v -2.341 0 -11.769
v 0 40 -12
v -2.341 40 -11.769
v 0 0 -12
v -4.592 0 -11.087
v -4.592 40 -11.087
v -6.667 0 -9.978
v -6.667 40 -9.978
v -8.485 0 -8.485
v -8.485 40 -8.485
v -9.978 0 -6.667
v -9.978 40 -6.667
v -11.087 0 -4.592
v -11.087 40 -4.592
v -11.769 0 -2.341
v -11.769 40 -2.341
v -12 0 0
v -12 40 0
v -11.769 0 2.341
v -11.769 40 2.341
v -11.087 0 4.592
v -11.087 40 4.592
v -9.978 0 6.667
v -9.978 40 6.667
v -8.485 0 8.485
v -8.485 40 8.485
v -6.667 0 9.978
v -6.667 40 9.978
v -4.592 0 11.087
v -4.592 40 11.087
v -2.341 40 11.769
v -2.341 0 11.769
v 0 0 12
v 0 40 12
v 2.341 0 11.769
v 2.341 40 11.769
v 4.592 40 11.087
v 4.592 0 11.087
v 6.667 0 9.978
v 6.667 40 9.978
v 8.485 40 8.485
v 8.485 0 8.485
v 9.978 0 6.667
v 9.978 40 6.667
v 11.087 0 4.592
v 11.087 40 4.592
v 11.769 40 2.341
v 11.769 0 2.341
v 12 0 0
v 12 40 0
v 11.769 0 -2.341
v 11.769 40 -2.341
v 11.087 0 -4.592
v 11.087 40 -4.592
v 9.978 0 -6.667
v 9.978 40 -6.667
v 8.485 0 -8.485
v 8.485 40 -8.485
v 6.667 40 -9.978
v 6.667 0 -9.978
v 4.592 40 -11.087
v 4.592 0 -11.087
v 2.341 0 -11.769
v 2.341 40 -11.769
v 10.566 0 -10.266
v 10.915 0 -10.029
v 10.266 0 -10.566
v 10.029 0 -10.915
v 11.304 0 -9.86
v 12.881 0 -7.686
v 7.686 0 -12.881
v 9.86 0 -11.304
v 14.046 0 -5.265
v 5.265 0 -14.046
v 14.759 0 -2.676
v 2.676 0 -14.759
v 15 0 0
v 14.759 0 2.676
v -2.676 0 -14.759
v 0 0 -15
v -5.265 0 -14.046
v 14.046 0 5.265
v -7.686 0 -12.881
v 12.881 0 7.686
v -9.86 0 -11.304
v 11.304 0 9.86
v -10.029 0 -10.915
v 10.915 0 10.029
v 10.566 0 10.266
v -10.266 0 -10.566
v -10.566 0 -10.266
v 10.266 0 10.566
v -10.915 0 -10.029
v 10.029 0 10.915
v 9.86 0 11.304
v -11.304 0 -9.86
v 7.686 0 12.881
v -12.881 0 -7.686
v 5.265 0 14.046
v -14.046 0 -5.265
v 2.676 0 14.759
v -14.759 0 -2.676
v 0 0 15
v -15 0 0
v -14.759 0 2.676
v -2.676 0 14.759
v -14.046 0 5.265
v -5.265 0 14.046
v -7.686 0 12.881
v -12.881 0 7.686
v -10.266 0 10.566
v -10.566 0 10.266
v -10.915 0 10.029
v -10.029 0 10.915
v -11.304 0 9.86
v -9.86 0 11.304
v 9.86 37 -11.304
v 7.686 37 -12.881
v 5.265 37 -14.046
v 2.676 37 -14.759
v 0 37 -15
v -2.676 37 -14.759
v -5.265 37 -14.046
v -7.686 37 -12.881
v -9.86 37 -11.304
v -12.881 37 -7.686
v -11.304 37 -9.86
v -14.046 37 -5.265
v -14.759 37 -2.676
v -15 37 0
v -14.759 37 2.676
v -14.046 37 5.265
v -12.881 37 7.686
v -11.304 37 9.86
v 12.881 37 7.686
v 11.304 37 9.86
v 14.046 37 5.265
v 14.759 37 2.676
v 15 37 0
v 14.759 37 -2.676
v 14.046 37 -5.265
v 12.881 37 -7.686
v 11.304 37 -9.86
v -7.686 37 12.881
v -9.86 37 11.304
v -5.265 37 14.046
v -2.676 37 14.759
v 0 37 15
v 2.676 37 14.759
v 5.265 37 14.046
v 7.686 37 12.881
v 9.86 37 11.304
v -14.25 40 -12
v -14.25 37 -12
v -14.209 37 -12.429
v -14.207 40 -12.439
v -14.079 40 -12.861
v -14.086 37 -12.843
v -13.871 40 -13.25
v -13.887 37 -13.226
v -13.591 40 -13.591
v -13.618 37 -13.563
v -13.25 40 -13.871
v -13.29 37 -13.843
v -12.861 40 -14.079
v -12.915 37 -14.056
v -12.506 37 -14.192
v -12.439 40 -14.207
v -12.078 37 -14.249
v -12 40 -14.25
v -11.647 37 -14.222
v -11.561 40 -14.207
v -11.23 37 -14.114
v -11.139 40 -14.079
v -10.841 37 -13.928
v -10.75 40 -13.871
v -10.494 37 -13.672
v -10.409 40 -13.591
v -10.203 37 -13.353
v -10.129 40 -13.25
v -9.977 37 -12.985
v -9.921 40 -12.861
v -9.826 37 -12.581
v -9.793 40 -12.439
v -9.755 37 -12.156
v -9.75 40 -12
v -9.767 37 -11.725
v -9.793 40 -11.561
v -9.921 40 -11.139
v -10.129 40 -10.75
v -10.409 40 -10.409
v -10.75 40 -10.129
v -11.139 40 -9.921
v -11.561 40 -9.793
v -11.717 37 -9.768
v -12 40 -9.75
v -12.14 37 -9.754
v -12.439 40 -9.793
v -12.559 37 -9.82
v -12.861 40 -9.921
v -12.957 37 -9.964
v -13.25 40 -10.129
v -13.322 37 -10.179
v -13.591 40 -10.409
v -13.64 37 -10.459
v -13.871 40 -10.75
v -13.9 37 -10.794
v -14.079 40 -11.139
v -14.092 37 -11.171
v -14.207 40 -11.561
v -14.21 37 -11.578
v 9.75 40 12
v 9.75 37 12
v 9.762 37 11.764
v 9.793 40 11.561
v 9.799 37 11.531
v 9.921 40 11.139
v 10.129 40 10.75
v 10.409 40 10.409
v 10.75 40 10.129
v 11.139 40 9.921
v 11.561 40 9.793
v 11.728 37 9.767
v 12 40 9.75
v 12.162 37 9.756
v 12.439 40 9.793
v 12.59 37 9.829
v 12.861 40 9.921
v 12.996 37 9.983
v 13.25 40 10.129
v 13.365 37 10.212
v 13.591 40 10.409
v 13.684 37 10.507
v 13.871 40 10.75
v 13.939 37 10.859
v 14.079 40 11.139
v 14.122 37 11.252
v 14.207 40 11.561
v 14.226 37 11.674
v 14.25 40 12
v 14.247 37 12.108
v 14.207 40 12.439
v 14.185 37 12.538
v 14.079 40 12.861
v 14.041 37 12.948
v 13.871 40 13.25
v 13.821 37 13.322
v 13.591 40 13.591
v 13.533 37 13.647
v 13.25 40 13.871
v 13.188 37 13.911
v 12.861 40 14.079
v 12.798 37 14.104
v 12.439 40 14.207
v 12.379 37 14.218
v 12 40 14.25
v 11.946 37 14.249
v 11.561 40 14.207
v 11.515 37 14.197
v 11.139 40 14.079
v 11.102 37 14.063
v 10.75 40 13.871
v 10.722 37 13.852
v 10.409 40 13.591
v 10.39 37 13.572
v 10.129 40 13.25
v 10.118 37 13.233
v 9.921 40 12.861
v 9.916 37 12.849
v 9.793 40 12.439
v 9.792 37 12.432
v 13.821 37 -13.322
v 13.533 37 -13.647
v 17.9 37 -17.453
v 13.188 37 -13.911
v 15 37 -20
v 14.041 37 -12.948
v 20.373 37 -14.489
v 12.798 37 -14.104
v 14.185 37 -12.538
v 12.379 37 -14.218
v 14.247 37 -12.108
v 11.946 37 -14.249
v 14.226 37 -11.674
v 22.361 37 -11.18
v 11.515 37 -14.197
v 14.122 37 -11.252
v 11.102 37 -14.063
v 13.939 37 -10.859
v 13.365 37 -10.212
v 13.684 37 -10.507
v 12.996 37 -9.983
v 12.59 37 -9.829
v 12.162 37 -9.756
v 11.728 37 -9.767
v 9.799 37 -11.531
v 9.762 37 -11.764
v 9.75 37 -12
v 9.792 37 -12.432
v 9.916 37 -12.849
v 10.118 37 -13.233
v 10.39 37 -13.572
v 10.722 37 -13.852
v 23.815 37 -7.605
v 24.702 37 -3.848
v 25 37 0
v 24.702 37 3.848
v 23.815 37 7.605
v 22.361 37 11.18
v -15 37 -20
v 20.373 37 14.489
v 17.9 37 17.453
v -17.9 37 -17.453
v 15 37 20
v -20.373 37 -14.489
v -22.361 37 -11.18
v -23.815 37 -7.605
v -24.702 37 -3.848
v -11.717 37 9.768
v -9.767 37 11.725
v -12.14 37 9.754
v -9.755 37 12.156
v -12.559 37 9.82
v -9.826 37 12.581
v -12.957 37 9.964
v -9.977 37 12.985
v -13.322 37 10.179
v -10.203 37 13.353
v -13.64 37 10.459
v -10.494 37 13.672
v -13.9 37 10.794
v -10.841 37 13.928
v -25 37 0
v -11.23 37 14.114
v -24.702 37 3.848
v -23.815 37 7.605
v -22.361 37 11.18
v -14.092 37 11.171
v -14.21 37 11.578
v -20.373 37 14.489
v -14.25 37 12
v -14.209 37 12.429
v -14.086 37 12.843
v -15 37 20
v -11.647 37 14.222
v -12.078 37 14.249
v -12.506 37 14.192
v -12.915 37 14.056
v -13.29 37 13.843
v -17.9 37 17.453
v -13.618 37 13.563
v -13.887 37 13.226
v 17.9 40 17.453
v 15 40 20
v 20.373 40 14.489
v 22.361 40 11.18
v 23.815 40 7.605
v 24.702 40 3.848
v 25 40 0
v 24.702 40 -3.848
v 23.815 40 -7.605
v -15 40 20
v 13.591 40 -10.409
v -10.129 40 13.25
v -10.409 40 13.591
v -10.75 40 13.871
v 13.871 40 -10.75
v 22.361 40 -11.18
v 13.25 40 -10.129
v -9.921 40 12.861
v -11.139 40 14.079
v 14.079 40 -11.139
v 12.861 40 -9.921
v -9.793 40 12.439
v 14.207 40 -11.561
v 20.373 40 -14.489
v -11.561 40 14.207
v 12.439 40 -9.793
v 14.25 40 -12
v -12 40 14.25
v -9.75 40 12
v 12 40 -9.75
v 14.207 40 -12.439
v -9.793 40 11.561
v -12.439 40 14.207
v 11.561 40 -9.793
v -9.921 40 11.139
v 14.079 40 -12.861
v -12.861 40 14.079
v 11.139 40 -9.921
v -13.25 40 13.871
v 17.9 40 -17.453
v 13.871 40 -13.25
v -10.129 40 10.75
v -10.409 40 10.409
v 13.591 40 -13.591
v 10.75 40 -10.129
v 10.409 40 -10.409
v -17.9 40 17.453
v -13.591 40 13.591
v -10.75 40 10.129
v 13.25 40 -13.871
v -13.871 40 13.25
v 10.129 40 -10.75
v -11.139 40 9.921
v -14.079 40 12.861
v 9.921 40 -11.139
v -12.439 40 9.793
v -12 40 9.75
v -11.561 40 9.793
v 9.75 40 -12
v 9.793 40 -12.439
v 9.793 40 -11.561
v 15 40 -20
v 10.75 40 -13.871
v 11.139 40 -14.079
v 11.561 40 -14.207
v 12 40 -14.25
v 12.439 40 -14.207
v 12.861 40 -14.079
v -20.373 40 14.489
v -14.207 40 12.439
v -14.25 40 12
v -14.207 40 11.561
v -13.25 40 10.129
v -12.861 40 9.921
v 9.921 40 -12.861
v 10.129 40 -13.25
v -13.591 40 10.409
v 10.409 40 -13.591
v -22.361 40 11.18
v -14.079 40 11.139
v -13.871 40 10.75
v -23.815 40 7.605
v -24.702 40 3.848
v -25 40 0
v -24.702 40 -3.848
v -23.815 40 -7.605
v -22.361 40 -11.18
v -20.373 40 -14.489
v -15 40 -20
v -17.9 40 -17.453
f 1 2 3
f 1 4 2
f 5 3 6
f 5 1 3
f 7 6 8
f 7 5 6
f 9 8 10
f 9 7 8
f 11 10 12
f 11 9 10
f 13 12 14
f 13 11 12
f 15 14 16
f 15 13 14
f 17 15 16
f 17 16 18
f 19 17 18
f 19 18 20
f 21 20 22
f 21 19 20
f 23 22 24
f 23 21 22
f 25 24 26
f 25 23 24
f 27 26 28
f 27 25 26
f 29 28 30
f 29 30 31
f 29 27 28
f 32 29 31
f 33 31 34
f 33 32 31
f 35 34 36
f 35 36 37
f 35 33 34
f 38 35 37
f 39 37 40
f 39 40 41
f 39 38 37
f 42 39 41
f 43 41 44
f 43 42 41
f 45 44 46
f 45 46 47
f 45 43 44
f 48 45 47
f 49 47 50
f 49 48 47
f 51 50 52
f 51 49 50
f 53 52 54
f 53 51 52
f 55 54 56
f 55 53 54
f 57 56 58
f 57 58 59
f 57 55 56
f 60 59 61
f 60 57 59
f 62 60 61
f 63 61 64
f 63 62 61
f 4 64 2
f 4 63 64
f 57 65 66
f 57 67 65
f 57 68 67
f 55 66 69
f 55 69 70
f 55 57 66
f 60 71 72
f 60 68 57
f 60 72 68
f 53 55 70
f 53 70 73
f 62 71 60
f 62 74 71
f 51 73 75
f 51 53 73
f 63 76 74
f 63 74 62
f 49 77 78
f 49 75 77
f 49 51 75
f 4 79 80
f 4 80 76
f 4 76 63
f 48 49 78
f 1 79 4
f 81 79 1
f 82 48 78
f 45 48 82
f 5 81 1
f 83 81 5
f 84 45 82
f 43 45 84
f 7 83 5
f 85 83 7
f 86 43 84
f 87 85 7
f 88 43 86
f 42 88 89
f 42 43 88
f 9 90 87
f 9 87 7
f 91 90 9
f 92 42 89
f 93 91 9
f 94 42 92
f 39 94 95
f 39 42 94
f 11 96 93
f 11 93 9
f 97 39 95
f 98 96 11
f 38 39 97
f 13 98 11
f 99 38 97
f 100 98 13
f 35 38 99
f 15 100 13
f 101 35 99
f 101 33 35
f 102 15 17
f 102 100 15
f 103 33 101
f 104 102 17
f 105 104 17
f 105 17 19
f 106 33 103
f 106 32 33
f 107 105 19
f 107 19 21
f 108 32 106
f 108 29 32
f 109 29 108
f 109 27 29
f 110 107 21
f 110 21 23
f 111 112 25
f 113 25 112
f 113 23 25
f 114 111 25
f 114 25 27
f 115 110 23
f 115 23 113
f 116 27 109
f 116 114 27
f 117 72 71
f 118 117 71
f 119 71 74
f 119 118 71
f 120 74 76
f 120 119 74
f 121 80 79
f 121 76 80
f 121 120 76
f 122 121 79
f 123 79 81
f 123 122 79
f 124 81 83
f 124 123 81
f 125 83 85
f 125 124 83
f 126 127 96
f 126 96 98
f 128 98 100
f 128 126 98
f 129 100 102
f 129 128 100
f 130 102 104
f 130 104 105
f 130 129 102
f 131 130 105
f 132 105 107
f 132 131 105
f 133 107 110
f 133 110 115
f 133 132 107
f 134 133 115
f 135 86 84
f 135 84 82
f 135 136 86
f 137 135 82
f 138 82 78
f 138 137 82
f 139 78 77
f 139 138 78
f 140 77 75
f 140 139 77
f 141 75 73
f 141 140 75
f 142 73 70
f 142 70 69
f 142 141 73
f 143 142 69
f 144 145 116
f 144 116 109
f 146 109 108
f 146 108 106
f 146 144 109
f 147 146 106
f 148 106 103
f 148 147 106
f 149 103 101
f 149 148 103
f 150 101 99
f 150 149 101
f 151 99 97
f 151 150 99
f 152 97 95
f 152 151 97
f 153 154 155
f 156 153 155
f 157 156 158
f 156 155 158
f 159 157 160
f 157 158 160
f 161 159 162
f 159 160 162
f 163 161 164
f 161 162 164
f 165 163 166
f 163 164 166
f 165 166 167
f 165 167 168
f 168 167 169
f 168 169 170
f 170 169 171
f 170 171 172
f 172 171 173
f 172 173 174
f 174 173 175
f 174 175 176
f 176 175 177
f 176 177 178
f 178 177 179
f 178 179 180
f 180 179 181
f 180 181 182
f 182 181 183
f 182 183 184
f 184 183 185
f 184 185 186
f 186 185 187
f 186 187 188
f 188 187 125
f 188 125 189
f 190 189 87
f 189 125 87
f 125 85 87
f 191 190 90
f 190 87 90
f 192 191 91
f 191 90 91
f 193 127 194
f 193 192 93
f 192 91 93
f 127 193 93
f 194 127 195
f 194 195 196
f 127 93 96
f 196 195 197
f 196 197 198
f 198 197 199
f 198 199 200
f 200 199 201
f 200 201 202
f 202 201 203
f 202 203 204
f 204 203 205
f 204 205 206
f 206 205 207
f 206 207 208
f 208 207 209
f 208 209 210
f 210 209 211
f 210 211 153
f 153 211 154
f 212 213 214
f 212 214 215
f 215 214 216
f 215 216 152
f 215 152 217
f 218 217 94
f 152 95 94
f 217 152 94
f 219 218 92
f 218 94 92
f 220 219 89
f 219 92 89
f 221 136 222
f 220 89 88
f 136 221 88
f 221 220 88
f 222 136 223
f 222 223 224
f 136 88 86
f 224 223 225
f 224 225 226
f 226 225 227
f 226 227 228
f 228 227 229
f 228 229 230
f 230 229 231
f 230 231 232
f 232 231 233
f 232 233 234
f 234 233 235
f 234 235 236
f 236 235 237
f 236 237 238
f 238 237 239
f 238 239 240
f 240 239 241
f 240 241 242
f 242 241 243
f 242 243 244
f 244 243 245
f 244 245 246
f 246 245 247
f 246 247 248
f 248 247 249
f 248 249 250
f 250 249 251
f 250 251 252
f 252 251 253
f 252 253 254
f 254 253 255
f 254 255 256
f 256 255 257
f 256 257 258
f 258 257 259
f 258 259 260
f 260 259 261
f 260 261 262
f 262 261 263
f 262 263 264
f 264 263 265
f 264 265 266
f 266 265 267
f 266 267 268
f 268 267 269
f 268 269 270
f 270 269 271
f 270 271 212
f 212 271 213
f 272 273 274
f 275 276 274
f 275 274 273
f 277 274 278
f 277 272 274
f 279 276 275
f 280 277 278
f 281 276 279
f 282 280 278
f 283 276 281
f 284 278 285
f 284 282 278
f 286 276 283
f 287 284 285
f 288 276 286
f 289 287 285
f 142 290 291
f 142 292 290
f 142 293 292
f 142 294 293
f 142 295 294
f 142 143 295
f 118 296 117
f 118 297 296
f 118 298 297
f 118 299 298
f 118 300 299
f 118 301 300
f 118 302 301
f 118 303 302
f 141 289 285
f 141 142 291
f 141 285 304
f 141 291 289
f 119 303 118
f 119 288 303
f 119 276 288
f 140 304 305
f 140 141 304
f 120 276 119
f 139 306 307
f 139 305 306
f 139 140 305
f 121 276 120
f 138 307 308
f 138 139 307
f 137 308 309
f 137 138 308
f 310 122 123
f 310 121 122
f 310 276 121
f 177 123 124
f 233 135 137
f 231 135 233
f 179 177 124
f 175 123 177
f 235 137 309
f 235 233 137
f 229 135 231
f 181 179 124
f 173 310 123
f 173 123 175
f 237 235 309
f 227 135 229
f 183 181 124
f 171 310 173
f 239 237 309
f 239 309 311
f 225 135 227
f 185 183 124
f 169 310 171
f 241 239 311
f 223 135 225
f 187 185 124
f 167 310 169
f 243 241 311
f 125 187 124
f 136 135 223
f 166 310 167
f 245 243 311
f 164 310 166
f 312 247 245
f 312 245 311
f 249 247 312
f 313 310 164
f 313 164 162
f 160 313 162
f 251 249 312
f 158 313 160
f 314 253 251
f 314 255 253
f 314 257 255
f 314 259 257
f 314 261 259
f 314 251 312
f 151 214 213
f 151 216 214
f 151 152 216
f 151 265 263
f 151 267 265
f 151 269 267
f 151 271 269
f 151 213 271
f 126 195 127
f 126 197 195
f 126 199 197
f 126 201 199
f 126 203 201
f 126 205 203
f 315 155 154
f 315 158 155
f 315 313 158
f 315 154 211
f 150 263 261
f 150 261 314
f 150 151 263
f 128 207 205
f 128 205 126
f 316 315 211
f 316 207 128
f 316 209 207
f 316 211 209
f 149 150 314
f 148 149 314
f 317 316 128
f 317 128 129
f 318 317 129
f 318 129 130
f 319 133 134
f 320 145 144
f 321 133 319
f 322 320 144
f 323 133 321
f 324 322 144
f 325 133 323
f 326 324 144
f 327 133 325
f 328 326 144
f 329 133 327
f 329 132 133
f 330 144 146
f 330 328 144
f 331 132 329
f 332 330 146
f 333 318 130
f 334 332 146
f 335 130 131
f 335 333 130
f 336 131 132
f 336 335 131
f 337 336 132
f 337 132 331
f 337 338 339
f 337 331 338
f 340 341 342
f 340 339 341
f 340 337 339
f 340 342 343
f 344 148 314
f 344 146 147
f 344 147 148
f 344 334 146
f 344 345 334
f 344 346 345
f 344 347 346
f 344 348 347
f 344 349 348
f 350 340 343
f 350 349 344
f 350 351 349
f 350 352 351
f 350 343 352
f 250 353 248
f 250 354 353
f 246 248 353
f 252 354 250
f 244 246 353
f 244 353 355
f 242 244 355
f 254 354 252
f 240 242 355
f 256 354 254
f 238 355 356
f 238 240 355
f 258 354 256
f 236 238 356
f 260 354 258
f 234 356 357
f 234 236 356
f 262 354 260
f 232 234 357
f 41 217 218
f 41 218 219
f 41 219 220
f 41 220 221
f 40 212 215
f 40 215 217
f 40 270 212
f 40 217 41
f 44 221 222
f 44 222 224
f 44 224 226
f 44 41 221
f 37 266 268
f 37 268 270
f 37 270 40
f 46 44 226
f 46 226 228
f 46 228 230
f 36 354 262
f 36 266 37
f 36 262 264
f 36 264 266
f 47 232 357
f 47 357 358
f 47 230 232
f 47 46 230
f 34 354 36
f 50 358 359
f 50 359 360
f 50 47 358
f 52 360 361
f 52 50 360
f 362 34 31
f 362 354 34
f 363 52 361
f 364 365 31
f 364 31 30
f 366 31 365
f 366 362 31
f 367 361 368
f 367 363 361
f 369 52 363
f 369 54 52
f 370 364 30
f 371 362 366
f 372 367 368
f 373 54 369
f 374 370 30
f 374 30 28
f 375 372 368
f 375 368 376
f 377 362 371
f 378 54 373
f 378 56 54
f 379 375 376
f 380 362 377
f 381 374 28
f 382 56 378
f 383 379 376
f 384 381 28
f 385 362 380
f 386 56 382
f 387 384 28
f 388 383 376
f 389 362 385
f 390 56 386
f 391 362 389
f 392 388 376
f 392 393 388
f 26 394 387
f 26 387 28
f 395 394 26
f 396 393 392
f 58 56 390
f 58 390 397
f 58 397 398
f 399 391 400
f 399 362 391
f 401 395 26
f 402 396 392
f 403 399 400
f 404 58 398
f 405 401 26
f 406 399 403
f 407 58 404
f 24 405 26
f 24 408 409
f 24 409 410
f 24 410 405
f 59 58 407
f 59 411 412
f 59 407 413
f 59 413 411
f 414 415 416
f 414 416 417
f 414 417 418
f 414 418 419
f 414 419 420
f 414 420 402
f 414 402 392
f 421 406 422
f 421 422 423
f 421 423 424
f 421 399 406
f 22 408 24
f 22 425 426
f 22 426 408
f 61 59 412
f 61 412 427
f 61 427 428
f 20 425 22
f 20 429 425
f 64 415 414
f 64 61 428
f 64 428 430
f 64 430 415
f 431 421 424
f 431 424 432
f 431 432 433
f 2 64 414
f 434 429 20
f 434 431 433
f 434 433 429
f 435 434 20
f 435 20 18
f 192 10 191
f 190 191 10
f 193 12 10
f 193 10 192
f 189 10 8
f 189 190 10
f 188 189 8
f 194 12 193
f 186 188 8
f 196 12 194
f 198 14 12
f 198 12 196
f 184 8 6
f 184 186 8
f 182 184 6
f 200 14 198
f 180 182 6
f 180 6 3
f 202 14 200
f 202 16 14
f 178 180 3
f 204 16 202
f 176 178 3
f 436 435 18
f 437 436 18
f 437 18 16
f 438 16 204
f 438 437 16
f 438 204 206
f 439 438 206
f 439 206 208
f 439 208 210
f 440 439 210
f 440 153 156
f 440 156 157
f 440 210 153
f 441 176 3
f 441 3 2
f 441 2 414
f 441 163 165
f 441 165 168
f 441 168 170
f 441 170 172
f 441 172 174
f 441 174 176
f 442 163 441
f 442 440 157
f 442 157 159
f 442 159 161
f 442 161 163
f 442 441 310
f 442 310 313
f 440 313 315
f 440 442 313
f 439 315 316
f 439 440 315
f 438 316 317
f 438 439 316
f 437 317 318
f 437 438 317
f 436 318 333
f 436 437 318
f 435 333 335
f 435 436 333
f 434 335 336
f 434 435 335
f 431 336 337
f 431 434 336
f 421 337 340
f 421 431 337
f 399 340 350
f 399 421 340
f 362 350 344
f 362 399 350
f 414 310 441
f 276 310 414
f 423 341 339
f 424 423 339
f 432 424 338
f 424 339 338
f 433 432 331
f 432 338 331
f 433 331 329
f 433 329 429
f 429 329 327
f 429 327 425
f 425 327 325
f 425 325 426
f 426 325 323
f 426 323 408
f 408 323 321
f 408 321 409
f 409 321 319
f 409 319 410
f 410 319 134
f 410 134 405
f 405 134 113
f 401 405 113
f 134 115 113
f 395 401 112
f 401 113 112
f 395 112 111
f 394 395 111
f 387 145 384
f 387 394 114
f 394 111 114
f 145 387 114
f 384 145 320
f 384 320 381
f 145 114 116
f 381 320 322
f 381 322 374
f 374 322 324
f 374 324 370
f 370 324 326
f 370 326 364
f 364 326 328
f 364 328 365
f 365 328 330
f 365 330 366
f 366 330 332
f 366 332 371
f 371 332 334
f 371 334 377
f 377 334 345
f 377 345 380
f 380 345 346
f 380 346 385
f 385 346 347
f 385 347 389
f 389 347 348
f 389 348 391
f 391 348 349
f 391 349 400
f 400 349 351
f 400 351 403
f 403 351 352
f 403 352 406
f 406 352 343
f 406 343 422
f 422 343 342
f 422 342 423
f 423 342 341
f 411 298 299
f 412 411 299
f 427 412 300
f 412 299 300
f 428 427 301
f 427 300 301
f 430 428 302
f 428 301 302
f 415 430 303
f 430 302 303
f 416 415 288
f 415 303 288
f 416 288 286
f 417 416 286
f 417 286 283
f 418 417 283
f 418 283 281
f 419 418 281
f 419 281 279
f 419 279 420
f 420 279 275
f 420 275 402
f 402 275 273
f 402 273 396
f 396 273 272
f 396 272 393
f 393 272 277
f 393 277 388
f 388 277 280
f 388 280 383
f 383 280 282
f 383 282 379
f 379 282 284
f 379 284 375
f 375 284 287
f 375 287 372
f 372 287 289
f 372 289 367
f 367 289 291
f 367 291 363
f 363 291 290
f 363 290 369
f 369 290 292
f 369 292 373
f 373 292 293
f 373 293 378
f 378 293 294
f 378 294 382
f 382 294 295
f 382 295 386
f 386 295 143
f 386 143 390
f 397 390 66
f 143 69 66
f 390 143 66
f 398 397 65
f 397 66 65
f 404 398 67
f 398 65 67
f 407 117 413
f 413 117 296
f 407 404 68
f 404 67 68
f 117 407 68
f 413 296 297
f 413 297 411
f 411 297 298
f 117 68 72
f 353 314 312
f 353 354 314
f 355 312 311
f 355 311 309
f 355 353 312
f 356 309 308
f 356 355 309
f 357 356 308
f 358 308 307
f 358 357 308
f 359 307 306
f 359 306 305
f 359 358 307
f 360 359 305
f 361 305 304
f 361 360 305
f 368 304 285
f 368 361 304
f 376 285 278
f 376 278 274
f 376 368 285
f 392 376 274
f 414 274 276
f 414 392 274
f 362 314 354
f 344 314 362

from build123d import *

# Parameters (mm, degrees)
CUT_EXTRUDE3_START   = 37
CUT_EXTRUDE3_DEPTH   = 3
M4_CLEARANCE_HOLE1_D = 4.5


# Read off the part's stored shape, not the designer's step: Cut-Extrude3
with BuildPart() as part:
    # Sketch1 → Revolve1 (revolve)
    with BuildSketch(Plane.XY, mode=Mode.PRIVATE) as revolve1_sk:
        Polygon((12, 40), (12, 0), (15, 0), (15, 37), (25, 37), (25, 40), align=None)
    revolve(revolve1_sk.sketch.rotate(Axis((0, 0, 0), (0, 1, 0)), 90), axis=Axis((0, 0, 0), (0, 1, 0)))

    # Cut-Extrude3 outline → Cut-Extrude3 (cut)
    with BuildSketch(Plane(origin=(0, 0, 0), x_dir=(1, 0, 0), z_dir=(0, 1, 0)).offset(CUT_EXTRUDE3_START)):
        with BuildLine():
            Line((15, -20), (-15, -20))
            ThreePointArc((-15, -20), (0, -25), (15, -20))
        make_face()
        with BuildLine():
            ThreePointArc((15, 20), (0, 25), (-15, 20))
            Line((-15, 20), (15, 20))
        make_face()
    extrude(amount=CUT_EXTRUDE3_DEPTH, mode=Mode.SUBTRACT)

    # M4 Clearance Hole1 (through all)
    with Locations(Plane(origin=(0, 40, 0), x_dir=(1, 0, 0), z_dir=(0, 1, 0))):
        with Locations((-12, 12), (12, 12), (12, -12), (-12, -12), (0, 0)):
            Hole(M4_CLEARANCE_HOLE1_D / 2)


solid = part.part
